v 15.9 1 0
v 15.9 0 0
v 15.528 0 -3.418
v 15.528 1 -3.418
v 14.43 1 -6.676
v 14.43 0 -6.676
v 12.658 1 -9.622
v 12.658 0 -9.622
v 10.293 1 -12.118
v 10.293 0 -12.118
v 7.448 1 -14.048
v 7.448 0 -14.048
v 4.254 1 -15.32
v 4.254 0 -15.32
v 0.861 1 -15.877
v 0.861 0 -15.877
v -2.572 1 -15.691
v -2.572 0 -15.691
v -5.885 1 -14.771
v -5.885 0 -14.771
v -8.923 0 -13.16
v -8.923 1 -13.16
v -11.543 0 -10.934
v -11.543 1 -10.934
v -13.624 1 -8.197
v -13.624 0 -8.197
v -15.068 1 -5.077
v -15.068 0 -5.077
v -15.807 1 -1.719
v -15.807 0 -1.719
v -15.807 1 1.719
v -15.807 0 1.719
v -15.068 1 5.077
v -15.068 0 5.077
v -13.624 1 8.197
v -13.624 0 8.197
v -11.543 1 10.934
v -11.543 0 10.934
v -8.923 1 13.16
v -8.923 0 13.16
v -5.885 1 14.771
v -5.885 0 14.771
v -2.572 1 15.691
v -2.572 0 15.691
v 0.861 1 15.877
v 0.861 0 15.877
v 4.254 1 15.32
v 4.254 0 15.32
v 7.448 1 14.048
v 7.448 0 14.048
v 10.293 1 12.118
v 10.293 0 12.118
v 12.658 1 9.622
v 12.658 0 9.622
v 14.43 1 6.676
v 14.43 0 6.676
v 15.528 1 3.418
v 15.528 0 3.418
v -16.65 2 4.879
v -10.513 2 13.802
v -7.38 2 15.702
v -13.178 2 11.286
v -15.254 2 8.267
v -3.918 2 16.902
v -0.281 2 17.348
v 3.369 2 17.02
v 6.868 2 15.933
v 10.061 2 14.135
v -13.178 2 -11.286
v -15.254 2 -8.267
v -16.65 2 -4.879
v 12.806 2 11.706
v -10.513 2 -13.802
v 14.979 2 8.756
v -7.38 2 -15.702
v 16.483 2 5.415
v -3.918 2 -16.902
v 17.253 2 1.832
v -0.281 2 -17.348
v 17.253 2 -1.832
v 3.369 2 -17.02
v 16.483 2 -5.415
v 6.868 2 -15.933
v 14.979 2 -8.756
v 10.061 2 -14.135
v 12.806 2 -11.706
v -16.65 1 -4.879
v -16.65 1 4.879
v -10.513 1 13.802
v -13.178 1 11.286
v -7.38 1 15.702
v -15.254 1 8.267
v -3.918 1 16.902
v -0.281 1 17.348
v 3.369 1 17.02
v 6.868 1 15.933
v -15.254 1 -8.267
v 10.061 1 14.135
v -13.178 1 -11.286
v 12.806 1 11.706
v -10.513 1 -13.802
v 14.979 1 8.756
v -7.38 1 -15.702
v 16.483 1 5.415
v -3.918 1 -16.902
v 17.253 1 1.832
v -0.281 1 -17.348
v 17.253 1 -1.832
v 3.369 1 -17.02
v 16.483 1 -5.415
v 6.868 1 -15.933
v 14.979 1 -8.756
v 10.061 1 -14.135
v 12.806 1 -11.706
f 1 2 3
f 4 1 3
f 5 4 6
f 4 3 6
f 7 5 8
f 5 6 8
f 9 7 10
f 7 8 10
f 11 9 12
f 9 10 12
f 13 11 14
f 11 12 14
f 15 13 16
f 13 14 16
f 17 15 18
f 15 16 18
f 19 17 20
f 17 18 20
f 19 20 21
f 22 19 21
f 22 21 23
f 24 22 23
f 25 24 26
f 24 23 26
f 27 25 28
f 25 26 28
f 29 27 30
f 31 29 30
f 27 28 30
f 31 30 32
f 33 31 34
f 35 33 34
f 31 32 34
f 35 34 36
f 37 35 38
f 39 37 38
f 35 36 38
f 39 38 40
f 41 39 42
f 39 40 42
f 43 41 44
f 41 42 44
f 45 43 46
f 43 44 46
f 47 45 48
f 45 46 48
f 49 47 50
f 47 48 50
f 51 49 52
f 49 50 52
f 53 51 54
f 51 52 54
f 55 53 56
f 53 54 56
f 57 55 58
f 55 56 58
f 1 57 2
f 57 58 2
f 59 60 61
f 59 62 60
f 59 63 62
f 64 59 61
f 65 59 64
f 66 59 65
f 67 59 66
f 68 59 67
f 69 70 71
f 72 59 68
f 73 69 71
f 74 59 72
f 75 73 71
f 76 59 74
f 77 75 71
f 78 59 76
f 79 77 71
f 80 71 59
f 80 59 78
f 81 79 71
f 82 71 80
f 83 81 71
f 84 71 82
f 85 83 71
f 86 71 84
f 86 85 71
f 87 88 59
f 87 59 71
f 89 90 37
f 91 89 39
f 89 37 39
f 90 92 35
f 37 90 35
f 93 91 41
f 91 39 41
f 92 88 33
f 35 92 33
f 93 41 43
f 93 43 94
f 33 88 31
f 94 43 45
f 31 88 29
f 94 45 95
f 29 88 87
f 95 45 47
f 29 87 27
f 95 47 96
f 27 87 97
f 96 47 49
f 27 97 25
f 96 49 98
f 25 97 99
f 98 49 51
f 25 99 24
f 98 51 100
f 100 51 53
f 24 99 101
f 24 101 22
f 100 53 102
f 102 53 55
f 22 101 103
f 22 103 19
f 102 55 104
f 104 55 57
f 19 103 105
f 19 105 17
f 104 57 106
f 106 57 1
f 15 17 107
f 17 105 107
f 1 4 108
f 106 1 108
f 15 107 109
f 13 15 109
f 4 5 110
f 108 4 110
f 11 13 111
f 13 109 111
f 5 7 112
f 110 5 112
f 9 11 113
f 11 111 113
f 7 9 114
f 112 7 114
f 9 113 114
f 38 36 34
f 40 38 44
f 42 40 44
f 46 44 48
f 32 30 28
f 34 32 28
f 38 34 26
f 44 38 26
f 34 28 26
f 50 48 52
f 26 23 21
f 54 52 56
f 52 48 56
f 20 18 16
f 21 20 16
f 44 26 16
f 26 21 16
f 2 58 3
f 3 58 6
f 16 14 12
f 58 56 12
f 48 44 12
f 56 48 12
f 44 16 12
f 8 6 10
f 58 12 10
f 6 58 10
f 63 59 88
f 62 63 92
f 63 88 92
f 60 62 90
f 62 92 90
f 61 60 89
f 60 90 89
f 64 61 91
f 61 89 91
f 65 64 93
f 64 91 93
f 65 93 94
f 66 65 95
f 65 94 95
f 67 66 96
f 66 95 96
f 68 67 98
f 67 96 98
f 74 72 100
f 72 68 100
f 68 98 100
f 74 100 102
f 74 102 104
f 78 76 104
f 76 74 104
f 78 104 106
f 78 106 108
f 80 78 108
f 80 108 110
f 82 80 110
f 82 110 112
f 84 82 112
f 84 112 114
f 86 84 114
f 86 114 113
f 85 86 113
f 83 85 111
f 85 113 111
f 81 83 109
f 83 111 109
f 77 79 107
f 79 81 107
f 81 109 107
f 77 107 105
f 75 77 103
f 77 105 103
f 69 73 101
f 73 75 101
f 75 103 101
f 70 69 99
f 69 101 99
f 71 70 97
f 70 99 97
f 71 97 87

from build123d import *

# Parameters (mm, degrees)
SKETCH_1_R          = 15.9
EXTRUDE_1_DEPTH     = 1
SKETCH_2_R          = 17.35
EXTRUDE_2_DEPTH     = 1
CUT_EXTRUDE_1_DEPTH = 1


with BuildPart() as part:
    # 草图1 → 凸台-拉伸1 (new body)
    with BuildSketch(Plane(origin=(0, 0, 0), x_dir=(1, 0, 0), z_dir=(0, 1, 0))):
        Circle(SKETCH_1_R)
    extrude(amount=EXTRUDE_1_DEPTH)

    # 草图2 → 凸台-拉伸2 (add)
    with BuildSketch(Plane(origin=(0, 1, 0), x_dir=(1, 0, 0), z_dir=(0, 1, 0))):
        Circle(SKETCH_2_R)
    extrude(amount=EXTRUDE_2_DEPTH)

    # 草图3 → 切除-拉伸1 (cut)
    with BuildSketch(Plane.XZ.offset(-1)):
        with BuildLine():
            Line((-16.65, 4.878524367), (-16.65, -4.878524367))
            ThreePointArc((-16.65, -4.878524367), (-17.35, 0), (-16.65, 4.878524367))
        make_face()
    extrude(amount=-CUT_EXTRUDE_1_DEPTH, mode=Mode.SUBTRACT)


solid = part.part
